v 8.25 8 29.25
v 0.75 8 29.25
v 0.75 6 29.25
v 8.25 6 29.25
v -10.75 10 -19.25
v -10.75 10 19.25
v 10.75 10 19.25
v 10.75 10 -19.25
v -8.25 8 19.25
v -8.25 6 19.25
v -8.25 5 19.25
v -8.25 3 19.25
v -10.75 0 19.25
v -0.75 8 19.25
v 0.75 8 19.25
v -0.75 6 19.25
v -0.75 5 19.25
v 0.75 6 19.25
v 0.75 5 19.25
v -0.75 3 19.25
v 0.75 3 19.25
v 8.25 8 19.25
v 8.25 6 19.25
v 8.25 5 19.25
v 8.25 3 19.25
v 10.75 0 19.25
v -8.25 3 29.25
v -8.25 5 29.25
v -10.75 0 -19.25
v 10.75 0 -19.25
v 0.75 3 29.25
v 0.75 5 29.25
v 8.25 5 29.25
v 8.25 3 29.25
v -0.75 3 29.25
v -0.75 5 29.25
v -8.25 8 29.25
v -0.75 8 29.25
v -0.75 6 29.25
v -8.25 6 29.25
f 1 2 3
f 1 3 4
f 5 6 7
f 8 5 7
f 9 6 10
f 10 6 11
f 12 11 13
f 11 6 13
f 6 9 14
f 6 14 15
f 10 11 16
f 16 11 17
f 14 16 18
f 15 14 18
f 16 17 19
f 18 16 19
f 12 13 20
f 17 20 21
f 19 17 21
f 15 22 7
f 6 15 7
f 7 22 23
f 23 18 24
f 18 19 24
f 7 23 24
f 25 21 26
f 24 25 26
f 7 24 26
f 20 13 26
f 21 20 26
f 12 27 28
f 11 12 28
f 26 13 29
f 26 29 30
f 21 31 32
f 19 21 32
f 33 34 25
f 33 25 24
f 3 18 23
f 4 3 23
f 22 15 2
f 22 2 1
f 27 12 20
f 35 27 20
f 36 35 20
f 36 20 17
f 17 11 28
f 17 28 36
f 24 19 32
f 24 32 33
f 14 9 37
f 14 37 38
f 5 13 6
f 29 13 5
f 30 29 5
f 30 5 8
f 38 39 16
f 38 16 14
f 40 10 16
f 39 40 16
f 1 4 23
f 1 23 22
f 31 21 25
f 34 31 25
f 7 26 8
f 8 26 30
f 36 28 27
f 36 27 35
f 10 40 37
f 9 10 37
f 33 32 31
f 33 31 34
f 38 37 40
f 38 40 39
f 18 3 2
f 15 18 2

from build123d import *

# Parameters (mm, degrees)
SKETCH1_W           = 21.5
SKETCH1_H           = 38.5
BOSS_EXTRUDE1_DEPTH = 10
SKETCH2_W           = 7.5
SKETCH2_H           = 2
BOSS_EXTRUDE2_DEPTH = 10


with BuildPart() as part:
    # Sketch1 → Boss-Extrude1 (new body)
    with BuildSketch(Plane(origin=(0, 0, 0), x_dir=(1, 0, 0), z_dir=(0, 1, 0))):
        Rectangle(SKETCH1_W, SKETCH1_H)
    extrude(amount=BOSS_EXTRUDE1_DEPTH)

    # Sketch2 → Boss-Extrude2 (add)
    with BuildSketch(Plane.XY.offset(19.25)):
        with Locations((-4.5, 7)):
            Rectangle(SKETCH2_W, SKETCH2_H)
        with Locations((4.5, 4)):
            Rectangle(SKETCH2_W, SKETCH2_H)
        with Locations((-4.5, 4)):
            Rectangle(SKETCH2_W, SKETCH2_H)
        with Locations((4.5, 7)):
            Rectangle(SKETCH2_W, SKETCH2_H)
    extrude(amount=BOSS_EXTRUDE2_DEPTH)


solid = part.part
